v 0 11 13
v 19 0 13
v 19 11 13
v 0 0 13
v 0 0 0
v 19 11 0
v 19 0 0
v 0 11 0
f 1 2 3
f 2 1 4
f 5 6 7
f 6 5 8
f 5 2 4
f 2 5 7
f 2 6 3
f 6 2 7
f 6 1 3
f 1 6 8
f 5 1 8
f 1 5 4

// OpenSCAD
// Generated by SolidPython 1.0.1 on 2020-07-29 00:46:56


cube(size = [19, 11, 13]);
/***********************************************
*********      SolidPython code:      **********
************************************************
 
# import packages: SolidPython
from solid import *
from solid.utils import *
from itertools import chain, combinations, permutations


class Resize:

    def __init__(self, scad_file):
        self.scad_file = scad_file
        #self.scad_file = import_scad(scad_file)
        # cone/cylinder param:
        self.r1 = 0
        self.r2 = 0
        self.h = 0
        # rectangular prism param:
        self.w = 0
        self.l = 0
        # ellipse param:
        self.r = 0

    # import OpenScad code (file name corresponds to shape)


    # classify shape + parameters
    def assign(self, param1, param2, param3):
        if self.scad_file == 'cone.scad':
            self.r1 = param1
            self.r2 = param2
            self.h = param3
        elif self.scad_file == 'cylinder.scad':
            self.r1 = param1
            self.r2 = param2
            self.h = param3
        elif self.scad_file == 'rectangularPrism.scad':
            self.h = param1
            self.l = param2
            self.w = param3
        else:
            self.r = param1
            self.h = param2

    # resize parameters
    def iterate(self):
        x = range(3, 20, 2)
        i = 1
        if self.scad_file == 'cone.scad':
            tempList = list(permutations(x, 2))
            for temp in tempList:
                param1 = temp[0]
                param2 = temp[1]
                filepath = 'produced_scad_files/' + 'cone' + str(param1) + '_' + str(param2) + '_' + '.scad'
                scad_render_to_file(cylinder(h=param1, r1=param2, r2=0), filepath)

        elif self.scad_file == 'cylinder.scad':
            tempList = list(permutations(x, 3))
            for temp in tempList:
                param1 = temp[0]
                param2 = temp[1]
                filepath = 'produced_scad_files/' + 'cylinder' + str(param1) + '_' + str(param2) + '_' + '.scad'
                scad_render_to_file(cylinder(h=param1, r1=param2, r2=param2), filepath)

        elif self.scad_file == 'rectangularPrism.scad':
            tempList = list(permutations(x, 3))
            for temp in tempList:
                param1 = temp[0]
                param2 = temp[1]
                param3 = temp[2]
                filepath = 'produced_scad_files/' + 'rectangularPrism' + str(param1) + '_' + str(param2) + '_' + str(
                    param3) + '.scad'
                scad_render_to_file(cube(size=(param1, param2, param3)), filepath)

        elif self.scad_file == 'ellipse.scad':
            tempList = list(permutations(x, 4))
            for temp in tempList:
                param1 = temp[0]
                param2 = temp[1]
                param3 = temp[2]
                param4 = temp[3]
                filepath = 'produced_scad_files/' + 'ellipse' + str(param1) + '_' + str(param2) + '_' + str(param3) + '_' + str(param4) + '.scad'
                scad_render_to_file(scale([param1, param2, param3])(sphere(r=param4)), filepath)

    def render_to_scadfile(self):
        scad_render_to_file(scad, 'example.scad') 
 
************************************************/
